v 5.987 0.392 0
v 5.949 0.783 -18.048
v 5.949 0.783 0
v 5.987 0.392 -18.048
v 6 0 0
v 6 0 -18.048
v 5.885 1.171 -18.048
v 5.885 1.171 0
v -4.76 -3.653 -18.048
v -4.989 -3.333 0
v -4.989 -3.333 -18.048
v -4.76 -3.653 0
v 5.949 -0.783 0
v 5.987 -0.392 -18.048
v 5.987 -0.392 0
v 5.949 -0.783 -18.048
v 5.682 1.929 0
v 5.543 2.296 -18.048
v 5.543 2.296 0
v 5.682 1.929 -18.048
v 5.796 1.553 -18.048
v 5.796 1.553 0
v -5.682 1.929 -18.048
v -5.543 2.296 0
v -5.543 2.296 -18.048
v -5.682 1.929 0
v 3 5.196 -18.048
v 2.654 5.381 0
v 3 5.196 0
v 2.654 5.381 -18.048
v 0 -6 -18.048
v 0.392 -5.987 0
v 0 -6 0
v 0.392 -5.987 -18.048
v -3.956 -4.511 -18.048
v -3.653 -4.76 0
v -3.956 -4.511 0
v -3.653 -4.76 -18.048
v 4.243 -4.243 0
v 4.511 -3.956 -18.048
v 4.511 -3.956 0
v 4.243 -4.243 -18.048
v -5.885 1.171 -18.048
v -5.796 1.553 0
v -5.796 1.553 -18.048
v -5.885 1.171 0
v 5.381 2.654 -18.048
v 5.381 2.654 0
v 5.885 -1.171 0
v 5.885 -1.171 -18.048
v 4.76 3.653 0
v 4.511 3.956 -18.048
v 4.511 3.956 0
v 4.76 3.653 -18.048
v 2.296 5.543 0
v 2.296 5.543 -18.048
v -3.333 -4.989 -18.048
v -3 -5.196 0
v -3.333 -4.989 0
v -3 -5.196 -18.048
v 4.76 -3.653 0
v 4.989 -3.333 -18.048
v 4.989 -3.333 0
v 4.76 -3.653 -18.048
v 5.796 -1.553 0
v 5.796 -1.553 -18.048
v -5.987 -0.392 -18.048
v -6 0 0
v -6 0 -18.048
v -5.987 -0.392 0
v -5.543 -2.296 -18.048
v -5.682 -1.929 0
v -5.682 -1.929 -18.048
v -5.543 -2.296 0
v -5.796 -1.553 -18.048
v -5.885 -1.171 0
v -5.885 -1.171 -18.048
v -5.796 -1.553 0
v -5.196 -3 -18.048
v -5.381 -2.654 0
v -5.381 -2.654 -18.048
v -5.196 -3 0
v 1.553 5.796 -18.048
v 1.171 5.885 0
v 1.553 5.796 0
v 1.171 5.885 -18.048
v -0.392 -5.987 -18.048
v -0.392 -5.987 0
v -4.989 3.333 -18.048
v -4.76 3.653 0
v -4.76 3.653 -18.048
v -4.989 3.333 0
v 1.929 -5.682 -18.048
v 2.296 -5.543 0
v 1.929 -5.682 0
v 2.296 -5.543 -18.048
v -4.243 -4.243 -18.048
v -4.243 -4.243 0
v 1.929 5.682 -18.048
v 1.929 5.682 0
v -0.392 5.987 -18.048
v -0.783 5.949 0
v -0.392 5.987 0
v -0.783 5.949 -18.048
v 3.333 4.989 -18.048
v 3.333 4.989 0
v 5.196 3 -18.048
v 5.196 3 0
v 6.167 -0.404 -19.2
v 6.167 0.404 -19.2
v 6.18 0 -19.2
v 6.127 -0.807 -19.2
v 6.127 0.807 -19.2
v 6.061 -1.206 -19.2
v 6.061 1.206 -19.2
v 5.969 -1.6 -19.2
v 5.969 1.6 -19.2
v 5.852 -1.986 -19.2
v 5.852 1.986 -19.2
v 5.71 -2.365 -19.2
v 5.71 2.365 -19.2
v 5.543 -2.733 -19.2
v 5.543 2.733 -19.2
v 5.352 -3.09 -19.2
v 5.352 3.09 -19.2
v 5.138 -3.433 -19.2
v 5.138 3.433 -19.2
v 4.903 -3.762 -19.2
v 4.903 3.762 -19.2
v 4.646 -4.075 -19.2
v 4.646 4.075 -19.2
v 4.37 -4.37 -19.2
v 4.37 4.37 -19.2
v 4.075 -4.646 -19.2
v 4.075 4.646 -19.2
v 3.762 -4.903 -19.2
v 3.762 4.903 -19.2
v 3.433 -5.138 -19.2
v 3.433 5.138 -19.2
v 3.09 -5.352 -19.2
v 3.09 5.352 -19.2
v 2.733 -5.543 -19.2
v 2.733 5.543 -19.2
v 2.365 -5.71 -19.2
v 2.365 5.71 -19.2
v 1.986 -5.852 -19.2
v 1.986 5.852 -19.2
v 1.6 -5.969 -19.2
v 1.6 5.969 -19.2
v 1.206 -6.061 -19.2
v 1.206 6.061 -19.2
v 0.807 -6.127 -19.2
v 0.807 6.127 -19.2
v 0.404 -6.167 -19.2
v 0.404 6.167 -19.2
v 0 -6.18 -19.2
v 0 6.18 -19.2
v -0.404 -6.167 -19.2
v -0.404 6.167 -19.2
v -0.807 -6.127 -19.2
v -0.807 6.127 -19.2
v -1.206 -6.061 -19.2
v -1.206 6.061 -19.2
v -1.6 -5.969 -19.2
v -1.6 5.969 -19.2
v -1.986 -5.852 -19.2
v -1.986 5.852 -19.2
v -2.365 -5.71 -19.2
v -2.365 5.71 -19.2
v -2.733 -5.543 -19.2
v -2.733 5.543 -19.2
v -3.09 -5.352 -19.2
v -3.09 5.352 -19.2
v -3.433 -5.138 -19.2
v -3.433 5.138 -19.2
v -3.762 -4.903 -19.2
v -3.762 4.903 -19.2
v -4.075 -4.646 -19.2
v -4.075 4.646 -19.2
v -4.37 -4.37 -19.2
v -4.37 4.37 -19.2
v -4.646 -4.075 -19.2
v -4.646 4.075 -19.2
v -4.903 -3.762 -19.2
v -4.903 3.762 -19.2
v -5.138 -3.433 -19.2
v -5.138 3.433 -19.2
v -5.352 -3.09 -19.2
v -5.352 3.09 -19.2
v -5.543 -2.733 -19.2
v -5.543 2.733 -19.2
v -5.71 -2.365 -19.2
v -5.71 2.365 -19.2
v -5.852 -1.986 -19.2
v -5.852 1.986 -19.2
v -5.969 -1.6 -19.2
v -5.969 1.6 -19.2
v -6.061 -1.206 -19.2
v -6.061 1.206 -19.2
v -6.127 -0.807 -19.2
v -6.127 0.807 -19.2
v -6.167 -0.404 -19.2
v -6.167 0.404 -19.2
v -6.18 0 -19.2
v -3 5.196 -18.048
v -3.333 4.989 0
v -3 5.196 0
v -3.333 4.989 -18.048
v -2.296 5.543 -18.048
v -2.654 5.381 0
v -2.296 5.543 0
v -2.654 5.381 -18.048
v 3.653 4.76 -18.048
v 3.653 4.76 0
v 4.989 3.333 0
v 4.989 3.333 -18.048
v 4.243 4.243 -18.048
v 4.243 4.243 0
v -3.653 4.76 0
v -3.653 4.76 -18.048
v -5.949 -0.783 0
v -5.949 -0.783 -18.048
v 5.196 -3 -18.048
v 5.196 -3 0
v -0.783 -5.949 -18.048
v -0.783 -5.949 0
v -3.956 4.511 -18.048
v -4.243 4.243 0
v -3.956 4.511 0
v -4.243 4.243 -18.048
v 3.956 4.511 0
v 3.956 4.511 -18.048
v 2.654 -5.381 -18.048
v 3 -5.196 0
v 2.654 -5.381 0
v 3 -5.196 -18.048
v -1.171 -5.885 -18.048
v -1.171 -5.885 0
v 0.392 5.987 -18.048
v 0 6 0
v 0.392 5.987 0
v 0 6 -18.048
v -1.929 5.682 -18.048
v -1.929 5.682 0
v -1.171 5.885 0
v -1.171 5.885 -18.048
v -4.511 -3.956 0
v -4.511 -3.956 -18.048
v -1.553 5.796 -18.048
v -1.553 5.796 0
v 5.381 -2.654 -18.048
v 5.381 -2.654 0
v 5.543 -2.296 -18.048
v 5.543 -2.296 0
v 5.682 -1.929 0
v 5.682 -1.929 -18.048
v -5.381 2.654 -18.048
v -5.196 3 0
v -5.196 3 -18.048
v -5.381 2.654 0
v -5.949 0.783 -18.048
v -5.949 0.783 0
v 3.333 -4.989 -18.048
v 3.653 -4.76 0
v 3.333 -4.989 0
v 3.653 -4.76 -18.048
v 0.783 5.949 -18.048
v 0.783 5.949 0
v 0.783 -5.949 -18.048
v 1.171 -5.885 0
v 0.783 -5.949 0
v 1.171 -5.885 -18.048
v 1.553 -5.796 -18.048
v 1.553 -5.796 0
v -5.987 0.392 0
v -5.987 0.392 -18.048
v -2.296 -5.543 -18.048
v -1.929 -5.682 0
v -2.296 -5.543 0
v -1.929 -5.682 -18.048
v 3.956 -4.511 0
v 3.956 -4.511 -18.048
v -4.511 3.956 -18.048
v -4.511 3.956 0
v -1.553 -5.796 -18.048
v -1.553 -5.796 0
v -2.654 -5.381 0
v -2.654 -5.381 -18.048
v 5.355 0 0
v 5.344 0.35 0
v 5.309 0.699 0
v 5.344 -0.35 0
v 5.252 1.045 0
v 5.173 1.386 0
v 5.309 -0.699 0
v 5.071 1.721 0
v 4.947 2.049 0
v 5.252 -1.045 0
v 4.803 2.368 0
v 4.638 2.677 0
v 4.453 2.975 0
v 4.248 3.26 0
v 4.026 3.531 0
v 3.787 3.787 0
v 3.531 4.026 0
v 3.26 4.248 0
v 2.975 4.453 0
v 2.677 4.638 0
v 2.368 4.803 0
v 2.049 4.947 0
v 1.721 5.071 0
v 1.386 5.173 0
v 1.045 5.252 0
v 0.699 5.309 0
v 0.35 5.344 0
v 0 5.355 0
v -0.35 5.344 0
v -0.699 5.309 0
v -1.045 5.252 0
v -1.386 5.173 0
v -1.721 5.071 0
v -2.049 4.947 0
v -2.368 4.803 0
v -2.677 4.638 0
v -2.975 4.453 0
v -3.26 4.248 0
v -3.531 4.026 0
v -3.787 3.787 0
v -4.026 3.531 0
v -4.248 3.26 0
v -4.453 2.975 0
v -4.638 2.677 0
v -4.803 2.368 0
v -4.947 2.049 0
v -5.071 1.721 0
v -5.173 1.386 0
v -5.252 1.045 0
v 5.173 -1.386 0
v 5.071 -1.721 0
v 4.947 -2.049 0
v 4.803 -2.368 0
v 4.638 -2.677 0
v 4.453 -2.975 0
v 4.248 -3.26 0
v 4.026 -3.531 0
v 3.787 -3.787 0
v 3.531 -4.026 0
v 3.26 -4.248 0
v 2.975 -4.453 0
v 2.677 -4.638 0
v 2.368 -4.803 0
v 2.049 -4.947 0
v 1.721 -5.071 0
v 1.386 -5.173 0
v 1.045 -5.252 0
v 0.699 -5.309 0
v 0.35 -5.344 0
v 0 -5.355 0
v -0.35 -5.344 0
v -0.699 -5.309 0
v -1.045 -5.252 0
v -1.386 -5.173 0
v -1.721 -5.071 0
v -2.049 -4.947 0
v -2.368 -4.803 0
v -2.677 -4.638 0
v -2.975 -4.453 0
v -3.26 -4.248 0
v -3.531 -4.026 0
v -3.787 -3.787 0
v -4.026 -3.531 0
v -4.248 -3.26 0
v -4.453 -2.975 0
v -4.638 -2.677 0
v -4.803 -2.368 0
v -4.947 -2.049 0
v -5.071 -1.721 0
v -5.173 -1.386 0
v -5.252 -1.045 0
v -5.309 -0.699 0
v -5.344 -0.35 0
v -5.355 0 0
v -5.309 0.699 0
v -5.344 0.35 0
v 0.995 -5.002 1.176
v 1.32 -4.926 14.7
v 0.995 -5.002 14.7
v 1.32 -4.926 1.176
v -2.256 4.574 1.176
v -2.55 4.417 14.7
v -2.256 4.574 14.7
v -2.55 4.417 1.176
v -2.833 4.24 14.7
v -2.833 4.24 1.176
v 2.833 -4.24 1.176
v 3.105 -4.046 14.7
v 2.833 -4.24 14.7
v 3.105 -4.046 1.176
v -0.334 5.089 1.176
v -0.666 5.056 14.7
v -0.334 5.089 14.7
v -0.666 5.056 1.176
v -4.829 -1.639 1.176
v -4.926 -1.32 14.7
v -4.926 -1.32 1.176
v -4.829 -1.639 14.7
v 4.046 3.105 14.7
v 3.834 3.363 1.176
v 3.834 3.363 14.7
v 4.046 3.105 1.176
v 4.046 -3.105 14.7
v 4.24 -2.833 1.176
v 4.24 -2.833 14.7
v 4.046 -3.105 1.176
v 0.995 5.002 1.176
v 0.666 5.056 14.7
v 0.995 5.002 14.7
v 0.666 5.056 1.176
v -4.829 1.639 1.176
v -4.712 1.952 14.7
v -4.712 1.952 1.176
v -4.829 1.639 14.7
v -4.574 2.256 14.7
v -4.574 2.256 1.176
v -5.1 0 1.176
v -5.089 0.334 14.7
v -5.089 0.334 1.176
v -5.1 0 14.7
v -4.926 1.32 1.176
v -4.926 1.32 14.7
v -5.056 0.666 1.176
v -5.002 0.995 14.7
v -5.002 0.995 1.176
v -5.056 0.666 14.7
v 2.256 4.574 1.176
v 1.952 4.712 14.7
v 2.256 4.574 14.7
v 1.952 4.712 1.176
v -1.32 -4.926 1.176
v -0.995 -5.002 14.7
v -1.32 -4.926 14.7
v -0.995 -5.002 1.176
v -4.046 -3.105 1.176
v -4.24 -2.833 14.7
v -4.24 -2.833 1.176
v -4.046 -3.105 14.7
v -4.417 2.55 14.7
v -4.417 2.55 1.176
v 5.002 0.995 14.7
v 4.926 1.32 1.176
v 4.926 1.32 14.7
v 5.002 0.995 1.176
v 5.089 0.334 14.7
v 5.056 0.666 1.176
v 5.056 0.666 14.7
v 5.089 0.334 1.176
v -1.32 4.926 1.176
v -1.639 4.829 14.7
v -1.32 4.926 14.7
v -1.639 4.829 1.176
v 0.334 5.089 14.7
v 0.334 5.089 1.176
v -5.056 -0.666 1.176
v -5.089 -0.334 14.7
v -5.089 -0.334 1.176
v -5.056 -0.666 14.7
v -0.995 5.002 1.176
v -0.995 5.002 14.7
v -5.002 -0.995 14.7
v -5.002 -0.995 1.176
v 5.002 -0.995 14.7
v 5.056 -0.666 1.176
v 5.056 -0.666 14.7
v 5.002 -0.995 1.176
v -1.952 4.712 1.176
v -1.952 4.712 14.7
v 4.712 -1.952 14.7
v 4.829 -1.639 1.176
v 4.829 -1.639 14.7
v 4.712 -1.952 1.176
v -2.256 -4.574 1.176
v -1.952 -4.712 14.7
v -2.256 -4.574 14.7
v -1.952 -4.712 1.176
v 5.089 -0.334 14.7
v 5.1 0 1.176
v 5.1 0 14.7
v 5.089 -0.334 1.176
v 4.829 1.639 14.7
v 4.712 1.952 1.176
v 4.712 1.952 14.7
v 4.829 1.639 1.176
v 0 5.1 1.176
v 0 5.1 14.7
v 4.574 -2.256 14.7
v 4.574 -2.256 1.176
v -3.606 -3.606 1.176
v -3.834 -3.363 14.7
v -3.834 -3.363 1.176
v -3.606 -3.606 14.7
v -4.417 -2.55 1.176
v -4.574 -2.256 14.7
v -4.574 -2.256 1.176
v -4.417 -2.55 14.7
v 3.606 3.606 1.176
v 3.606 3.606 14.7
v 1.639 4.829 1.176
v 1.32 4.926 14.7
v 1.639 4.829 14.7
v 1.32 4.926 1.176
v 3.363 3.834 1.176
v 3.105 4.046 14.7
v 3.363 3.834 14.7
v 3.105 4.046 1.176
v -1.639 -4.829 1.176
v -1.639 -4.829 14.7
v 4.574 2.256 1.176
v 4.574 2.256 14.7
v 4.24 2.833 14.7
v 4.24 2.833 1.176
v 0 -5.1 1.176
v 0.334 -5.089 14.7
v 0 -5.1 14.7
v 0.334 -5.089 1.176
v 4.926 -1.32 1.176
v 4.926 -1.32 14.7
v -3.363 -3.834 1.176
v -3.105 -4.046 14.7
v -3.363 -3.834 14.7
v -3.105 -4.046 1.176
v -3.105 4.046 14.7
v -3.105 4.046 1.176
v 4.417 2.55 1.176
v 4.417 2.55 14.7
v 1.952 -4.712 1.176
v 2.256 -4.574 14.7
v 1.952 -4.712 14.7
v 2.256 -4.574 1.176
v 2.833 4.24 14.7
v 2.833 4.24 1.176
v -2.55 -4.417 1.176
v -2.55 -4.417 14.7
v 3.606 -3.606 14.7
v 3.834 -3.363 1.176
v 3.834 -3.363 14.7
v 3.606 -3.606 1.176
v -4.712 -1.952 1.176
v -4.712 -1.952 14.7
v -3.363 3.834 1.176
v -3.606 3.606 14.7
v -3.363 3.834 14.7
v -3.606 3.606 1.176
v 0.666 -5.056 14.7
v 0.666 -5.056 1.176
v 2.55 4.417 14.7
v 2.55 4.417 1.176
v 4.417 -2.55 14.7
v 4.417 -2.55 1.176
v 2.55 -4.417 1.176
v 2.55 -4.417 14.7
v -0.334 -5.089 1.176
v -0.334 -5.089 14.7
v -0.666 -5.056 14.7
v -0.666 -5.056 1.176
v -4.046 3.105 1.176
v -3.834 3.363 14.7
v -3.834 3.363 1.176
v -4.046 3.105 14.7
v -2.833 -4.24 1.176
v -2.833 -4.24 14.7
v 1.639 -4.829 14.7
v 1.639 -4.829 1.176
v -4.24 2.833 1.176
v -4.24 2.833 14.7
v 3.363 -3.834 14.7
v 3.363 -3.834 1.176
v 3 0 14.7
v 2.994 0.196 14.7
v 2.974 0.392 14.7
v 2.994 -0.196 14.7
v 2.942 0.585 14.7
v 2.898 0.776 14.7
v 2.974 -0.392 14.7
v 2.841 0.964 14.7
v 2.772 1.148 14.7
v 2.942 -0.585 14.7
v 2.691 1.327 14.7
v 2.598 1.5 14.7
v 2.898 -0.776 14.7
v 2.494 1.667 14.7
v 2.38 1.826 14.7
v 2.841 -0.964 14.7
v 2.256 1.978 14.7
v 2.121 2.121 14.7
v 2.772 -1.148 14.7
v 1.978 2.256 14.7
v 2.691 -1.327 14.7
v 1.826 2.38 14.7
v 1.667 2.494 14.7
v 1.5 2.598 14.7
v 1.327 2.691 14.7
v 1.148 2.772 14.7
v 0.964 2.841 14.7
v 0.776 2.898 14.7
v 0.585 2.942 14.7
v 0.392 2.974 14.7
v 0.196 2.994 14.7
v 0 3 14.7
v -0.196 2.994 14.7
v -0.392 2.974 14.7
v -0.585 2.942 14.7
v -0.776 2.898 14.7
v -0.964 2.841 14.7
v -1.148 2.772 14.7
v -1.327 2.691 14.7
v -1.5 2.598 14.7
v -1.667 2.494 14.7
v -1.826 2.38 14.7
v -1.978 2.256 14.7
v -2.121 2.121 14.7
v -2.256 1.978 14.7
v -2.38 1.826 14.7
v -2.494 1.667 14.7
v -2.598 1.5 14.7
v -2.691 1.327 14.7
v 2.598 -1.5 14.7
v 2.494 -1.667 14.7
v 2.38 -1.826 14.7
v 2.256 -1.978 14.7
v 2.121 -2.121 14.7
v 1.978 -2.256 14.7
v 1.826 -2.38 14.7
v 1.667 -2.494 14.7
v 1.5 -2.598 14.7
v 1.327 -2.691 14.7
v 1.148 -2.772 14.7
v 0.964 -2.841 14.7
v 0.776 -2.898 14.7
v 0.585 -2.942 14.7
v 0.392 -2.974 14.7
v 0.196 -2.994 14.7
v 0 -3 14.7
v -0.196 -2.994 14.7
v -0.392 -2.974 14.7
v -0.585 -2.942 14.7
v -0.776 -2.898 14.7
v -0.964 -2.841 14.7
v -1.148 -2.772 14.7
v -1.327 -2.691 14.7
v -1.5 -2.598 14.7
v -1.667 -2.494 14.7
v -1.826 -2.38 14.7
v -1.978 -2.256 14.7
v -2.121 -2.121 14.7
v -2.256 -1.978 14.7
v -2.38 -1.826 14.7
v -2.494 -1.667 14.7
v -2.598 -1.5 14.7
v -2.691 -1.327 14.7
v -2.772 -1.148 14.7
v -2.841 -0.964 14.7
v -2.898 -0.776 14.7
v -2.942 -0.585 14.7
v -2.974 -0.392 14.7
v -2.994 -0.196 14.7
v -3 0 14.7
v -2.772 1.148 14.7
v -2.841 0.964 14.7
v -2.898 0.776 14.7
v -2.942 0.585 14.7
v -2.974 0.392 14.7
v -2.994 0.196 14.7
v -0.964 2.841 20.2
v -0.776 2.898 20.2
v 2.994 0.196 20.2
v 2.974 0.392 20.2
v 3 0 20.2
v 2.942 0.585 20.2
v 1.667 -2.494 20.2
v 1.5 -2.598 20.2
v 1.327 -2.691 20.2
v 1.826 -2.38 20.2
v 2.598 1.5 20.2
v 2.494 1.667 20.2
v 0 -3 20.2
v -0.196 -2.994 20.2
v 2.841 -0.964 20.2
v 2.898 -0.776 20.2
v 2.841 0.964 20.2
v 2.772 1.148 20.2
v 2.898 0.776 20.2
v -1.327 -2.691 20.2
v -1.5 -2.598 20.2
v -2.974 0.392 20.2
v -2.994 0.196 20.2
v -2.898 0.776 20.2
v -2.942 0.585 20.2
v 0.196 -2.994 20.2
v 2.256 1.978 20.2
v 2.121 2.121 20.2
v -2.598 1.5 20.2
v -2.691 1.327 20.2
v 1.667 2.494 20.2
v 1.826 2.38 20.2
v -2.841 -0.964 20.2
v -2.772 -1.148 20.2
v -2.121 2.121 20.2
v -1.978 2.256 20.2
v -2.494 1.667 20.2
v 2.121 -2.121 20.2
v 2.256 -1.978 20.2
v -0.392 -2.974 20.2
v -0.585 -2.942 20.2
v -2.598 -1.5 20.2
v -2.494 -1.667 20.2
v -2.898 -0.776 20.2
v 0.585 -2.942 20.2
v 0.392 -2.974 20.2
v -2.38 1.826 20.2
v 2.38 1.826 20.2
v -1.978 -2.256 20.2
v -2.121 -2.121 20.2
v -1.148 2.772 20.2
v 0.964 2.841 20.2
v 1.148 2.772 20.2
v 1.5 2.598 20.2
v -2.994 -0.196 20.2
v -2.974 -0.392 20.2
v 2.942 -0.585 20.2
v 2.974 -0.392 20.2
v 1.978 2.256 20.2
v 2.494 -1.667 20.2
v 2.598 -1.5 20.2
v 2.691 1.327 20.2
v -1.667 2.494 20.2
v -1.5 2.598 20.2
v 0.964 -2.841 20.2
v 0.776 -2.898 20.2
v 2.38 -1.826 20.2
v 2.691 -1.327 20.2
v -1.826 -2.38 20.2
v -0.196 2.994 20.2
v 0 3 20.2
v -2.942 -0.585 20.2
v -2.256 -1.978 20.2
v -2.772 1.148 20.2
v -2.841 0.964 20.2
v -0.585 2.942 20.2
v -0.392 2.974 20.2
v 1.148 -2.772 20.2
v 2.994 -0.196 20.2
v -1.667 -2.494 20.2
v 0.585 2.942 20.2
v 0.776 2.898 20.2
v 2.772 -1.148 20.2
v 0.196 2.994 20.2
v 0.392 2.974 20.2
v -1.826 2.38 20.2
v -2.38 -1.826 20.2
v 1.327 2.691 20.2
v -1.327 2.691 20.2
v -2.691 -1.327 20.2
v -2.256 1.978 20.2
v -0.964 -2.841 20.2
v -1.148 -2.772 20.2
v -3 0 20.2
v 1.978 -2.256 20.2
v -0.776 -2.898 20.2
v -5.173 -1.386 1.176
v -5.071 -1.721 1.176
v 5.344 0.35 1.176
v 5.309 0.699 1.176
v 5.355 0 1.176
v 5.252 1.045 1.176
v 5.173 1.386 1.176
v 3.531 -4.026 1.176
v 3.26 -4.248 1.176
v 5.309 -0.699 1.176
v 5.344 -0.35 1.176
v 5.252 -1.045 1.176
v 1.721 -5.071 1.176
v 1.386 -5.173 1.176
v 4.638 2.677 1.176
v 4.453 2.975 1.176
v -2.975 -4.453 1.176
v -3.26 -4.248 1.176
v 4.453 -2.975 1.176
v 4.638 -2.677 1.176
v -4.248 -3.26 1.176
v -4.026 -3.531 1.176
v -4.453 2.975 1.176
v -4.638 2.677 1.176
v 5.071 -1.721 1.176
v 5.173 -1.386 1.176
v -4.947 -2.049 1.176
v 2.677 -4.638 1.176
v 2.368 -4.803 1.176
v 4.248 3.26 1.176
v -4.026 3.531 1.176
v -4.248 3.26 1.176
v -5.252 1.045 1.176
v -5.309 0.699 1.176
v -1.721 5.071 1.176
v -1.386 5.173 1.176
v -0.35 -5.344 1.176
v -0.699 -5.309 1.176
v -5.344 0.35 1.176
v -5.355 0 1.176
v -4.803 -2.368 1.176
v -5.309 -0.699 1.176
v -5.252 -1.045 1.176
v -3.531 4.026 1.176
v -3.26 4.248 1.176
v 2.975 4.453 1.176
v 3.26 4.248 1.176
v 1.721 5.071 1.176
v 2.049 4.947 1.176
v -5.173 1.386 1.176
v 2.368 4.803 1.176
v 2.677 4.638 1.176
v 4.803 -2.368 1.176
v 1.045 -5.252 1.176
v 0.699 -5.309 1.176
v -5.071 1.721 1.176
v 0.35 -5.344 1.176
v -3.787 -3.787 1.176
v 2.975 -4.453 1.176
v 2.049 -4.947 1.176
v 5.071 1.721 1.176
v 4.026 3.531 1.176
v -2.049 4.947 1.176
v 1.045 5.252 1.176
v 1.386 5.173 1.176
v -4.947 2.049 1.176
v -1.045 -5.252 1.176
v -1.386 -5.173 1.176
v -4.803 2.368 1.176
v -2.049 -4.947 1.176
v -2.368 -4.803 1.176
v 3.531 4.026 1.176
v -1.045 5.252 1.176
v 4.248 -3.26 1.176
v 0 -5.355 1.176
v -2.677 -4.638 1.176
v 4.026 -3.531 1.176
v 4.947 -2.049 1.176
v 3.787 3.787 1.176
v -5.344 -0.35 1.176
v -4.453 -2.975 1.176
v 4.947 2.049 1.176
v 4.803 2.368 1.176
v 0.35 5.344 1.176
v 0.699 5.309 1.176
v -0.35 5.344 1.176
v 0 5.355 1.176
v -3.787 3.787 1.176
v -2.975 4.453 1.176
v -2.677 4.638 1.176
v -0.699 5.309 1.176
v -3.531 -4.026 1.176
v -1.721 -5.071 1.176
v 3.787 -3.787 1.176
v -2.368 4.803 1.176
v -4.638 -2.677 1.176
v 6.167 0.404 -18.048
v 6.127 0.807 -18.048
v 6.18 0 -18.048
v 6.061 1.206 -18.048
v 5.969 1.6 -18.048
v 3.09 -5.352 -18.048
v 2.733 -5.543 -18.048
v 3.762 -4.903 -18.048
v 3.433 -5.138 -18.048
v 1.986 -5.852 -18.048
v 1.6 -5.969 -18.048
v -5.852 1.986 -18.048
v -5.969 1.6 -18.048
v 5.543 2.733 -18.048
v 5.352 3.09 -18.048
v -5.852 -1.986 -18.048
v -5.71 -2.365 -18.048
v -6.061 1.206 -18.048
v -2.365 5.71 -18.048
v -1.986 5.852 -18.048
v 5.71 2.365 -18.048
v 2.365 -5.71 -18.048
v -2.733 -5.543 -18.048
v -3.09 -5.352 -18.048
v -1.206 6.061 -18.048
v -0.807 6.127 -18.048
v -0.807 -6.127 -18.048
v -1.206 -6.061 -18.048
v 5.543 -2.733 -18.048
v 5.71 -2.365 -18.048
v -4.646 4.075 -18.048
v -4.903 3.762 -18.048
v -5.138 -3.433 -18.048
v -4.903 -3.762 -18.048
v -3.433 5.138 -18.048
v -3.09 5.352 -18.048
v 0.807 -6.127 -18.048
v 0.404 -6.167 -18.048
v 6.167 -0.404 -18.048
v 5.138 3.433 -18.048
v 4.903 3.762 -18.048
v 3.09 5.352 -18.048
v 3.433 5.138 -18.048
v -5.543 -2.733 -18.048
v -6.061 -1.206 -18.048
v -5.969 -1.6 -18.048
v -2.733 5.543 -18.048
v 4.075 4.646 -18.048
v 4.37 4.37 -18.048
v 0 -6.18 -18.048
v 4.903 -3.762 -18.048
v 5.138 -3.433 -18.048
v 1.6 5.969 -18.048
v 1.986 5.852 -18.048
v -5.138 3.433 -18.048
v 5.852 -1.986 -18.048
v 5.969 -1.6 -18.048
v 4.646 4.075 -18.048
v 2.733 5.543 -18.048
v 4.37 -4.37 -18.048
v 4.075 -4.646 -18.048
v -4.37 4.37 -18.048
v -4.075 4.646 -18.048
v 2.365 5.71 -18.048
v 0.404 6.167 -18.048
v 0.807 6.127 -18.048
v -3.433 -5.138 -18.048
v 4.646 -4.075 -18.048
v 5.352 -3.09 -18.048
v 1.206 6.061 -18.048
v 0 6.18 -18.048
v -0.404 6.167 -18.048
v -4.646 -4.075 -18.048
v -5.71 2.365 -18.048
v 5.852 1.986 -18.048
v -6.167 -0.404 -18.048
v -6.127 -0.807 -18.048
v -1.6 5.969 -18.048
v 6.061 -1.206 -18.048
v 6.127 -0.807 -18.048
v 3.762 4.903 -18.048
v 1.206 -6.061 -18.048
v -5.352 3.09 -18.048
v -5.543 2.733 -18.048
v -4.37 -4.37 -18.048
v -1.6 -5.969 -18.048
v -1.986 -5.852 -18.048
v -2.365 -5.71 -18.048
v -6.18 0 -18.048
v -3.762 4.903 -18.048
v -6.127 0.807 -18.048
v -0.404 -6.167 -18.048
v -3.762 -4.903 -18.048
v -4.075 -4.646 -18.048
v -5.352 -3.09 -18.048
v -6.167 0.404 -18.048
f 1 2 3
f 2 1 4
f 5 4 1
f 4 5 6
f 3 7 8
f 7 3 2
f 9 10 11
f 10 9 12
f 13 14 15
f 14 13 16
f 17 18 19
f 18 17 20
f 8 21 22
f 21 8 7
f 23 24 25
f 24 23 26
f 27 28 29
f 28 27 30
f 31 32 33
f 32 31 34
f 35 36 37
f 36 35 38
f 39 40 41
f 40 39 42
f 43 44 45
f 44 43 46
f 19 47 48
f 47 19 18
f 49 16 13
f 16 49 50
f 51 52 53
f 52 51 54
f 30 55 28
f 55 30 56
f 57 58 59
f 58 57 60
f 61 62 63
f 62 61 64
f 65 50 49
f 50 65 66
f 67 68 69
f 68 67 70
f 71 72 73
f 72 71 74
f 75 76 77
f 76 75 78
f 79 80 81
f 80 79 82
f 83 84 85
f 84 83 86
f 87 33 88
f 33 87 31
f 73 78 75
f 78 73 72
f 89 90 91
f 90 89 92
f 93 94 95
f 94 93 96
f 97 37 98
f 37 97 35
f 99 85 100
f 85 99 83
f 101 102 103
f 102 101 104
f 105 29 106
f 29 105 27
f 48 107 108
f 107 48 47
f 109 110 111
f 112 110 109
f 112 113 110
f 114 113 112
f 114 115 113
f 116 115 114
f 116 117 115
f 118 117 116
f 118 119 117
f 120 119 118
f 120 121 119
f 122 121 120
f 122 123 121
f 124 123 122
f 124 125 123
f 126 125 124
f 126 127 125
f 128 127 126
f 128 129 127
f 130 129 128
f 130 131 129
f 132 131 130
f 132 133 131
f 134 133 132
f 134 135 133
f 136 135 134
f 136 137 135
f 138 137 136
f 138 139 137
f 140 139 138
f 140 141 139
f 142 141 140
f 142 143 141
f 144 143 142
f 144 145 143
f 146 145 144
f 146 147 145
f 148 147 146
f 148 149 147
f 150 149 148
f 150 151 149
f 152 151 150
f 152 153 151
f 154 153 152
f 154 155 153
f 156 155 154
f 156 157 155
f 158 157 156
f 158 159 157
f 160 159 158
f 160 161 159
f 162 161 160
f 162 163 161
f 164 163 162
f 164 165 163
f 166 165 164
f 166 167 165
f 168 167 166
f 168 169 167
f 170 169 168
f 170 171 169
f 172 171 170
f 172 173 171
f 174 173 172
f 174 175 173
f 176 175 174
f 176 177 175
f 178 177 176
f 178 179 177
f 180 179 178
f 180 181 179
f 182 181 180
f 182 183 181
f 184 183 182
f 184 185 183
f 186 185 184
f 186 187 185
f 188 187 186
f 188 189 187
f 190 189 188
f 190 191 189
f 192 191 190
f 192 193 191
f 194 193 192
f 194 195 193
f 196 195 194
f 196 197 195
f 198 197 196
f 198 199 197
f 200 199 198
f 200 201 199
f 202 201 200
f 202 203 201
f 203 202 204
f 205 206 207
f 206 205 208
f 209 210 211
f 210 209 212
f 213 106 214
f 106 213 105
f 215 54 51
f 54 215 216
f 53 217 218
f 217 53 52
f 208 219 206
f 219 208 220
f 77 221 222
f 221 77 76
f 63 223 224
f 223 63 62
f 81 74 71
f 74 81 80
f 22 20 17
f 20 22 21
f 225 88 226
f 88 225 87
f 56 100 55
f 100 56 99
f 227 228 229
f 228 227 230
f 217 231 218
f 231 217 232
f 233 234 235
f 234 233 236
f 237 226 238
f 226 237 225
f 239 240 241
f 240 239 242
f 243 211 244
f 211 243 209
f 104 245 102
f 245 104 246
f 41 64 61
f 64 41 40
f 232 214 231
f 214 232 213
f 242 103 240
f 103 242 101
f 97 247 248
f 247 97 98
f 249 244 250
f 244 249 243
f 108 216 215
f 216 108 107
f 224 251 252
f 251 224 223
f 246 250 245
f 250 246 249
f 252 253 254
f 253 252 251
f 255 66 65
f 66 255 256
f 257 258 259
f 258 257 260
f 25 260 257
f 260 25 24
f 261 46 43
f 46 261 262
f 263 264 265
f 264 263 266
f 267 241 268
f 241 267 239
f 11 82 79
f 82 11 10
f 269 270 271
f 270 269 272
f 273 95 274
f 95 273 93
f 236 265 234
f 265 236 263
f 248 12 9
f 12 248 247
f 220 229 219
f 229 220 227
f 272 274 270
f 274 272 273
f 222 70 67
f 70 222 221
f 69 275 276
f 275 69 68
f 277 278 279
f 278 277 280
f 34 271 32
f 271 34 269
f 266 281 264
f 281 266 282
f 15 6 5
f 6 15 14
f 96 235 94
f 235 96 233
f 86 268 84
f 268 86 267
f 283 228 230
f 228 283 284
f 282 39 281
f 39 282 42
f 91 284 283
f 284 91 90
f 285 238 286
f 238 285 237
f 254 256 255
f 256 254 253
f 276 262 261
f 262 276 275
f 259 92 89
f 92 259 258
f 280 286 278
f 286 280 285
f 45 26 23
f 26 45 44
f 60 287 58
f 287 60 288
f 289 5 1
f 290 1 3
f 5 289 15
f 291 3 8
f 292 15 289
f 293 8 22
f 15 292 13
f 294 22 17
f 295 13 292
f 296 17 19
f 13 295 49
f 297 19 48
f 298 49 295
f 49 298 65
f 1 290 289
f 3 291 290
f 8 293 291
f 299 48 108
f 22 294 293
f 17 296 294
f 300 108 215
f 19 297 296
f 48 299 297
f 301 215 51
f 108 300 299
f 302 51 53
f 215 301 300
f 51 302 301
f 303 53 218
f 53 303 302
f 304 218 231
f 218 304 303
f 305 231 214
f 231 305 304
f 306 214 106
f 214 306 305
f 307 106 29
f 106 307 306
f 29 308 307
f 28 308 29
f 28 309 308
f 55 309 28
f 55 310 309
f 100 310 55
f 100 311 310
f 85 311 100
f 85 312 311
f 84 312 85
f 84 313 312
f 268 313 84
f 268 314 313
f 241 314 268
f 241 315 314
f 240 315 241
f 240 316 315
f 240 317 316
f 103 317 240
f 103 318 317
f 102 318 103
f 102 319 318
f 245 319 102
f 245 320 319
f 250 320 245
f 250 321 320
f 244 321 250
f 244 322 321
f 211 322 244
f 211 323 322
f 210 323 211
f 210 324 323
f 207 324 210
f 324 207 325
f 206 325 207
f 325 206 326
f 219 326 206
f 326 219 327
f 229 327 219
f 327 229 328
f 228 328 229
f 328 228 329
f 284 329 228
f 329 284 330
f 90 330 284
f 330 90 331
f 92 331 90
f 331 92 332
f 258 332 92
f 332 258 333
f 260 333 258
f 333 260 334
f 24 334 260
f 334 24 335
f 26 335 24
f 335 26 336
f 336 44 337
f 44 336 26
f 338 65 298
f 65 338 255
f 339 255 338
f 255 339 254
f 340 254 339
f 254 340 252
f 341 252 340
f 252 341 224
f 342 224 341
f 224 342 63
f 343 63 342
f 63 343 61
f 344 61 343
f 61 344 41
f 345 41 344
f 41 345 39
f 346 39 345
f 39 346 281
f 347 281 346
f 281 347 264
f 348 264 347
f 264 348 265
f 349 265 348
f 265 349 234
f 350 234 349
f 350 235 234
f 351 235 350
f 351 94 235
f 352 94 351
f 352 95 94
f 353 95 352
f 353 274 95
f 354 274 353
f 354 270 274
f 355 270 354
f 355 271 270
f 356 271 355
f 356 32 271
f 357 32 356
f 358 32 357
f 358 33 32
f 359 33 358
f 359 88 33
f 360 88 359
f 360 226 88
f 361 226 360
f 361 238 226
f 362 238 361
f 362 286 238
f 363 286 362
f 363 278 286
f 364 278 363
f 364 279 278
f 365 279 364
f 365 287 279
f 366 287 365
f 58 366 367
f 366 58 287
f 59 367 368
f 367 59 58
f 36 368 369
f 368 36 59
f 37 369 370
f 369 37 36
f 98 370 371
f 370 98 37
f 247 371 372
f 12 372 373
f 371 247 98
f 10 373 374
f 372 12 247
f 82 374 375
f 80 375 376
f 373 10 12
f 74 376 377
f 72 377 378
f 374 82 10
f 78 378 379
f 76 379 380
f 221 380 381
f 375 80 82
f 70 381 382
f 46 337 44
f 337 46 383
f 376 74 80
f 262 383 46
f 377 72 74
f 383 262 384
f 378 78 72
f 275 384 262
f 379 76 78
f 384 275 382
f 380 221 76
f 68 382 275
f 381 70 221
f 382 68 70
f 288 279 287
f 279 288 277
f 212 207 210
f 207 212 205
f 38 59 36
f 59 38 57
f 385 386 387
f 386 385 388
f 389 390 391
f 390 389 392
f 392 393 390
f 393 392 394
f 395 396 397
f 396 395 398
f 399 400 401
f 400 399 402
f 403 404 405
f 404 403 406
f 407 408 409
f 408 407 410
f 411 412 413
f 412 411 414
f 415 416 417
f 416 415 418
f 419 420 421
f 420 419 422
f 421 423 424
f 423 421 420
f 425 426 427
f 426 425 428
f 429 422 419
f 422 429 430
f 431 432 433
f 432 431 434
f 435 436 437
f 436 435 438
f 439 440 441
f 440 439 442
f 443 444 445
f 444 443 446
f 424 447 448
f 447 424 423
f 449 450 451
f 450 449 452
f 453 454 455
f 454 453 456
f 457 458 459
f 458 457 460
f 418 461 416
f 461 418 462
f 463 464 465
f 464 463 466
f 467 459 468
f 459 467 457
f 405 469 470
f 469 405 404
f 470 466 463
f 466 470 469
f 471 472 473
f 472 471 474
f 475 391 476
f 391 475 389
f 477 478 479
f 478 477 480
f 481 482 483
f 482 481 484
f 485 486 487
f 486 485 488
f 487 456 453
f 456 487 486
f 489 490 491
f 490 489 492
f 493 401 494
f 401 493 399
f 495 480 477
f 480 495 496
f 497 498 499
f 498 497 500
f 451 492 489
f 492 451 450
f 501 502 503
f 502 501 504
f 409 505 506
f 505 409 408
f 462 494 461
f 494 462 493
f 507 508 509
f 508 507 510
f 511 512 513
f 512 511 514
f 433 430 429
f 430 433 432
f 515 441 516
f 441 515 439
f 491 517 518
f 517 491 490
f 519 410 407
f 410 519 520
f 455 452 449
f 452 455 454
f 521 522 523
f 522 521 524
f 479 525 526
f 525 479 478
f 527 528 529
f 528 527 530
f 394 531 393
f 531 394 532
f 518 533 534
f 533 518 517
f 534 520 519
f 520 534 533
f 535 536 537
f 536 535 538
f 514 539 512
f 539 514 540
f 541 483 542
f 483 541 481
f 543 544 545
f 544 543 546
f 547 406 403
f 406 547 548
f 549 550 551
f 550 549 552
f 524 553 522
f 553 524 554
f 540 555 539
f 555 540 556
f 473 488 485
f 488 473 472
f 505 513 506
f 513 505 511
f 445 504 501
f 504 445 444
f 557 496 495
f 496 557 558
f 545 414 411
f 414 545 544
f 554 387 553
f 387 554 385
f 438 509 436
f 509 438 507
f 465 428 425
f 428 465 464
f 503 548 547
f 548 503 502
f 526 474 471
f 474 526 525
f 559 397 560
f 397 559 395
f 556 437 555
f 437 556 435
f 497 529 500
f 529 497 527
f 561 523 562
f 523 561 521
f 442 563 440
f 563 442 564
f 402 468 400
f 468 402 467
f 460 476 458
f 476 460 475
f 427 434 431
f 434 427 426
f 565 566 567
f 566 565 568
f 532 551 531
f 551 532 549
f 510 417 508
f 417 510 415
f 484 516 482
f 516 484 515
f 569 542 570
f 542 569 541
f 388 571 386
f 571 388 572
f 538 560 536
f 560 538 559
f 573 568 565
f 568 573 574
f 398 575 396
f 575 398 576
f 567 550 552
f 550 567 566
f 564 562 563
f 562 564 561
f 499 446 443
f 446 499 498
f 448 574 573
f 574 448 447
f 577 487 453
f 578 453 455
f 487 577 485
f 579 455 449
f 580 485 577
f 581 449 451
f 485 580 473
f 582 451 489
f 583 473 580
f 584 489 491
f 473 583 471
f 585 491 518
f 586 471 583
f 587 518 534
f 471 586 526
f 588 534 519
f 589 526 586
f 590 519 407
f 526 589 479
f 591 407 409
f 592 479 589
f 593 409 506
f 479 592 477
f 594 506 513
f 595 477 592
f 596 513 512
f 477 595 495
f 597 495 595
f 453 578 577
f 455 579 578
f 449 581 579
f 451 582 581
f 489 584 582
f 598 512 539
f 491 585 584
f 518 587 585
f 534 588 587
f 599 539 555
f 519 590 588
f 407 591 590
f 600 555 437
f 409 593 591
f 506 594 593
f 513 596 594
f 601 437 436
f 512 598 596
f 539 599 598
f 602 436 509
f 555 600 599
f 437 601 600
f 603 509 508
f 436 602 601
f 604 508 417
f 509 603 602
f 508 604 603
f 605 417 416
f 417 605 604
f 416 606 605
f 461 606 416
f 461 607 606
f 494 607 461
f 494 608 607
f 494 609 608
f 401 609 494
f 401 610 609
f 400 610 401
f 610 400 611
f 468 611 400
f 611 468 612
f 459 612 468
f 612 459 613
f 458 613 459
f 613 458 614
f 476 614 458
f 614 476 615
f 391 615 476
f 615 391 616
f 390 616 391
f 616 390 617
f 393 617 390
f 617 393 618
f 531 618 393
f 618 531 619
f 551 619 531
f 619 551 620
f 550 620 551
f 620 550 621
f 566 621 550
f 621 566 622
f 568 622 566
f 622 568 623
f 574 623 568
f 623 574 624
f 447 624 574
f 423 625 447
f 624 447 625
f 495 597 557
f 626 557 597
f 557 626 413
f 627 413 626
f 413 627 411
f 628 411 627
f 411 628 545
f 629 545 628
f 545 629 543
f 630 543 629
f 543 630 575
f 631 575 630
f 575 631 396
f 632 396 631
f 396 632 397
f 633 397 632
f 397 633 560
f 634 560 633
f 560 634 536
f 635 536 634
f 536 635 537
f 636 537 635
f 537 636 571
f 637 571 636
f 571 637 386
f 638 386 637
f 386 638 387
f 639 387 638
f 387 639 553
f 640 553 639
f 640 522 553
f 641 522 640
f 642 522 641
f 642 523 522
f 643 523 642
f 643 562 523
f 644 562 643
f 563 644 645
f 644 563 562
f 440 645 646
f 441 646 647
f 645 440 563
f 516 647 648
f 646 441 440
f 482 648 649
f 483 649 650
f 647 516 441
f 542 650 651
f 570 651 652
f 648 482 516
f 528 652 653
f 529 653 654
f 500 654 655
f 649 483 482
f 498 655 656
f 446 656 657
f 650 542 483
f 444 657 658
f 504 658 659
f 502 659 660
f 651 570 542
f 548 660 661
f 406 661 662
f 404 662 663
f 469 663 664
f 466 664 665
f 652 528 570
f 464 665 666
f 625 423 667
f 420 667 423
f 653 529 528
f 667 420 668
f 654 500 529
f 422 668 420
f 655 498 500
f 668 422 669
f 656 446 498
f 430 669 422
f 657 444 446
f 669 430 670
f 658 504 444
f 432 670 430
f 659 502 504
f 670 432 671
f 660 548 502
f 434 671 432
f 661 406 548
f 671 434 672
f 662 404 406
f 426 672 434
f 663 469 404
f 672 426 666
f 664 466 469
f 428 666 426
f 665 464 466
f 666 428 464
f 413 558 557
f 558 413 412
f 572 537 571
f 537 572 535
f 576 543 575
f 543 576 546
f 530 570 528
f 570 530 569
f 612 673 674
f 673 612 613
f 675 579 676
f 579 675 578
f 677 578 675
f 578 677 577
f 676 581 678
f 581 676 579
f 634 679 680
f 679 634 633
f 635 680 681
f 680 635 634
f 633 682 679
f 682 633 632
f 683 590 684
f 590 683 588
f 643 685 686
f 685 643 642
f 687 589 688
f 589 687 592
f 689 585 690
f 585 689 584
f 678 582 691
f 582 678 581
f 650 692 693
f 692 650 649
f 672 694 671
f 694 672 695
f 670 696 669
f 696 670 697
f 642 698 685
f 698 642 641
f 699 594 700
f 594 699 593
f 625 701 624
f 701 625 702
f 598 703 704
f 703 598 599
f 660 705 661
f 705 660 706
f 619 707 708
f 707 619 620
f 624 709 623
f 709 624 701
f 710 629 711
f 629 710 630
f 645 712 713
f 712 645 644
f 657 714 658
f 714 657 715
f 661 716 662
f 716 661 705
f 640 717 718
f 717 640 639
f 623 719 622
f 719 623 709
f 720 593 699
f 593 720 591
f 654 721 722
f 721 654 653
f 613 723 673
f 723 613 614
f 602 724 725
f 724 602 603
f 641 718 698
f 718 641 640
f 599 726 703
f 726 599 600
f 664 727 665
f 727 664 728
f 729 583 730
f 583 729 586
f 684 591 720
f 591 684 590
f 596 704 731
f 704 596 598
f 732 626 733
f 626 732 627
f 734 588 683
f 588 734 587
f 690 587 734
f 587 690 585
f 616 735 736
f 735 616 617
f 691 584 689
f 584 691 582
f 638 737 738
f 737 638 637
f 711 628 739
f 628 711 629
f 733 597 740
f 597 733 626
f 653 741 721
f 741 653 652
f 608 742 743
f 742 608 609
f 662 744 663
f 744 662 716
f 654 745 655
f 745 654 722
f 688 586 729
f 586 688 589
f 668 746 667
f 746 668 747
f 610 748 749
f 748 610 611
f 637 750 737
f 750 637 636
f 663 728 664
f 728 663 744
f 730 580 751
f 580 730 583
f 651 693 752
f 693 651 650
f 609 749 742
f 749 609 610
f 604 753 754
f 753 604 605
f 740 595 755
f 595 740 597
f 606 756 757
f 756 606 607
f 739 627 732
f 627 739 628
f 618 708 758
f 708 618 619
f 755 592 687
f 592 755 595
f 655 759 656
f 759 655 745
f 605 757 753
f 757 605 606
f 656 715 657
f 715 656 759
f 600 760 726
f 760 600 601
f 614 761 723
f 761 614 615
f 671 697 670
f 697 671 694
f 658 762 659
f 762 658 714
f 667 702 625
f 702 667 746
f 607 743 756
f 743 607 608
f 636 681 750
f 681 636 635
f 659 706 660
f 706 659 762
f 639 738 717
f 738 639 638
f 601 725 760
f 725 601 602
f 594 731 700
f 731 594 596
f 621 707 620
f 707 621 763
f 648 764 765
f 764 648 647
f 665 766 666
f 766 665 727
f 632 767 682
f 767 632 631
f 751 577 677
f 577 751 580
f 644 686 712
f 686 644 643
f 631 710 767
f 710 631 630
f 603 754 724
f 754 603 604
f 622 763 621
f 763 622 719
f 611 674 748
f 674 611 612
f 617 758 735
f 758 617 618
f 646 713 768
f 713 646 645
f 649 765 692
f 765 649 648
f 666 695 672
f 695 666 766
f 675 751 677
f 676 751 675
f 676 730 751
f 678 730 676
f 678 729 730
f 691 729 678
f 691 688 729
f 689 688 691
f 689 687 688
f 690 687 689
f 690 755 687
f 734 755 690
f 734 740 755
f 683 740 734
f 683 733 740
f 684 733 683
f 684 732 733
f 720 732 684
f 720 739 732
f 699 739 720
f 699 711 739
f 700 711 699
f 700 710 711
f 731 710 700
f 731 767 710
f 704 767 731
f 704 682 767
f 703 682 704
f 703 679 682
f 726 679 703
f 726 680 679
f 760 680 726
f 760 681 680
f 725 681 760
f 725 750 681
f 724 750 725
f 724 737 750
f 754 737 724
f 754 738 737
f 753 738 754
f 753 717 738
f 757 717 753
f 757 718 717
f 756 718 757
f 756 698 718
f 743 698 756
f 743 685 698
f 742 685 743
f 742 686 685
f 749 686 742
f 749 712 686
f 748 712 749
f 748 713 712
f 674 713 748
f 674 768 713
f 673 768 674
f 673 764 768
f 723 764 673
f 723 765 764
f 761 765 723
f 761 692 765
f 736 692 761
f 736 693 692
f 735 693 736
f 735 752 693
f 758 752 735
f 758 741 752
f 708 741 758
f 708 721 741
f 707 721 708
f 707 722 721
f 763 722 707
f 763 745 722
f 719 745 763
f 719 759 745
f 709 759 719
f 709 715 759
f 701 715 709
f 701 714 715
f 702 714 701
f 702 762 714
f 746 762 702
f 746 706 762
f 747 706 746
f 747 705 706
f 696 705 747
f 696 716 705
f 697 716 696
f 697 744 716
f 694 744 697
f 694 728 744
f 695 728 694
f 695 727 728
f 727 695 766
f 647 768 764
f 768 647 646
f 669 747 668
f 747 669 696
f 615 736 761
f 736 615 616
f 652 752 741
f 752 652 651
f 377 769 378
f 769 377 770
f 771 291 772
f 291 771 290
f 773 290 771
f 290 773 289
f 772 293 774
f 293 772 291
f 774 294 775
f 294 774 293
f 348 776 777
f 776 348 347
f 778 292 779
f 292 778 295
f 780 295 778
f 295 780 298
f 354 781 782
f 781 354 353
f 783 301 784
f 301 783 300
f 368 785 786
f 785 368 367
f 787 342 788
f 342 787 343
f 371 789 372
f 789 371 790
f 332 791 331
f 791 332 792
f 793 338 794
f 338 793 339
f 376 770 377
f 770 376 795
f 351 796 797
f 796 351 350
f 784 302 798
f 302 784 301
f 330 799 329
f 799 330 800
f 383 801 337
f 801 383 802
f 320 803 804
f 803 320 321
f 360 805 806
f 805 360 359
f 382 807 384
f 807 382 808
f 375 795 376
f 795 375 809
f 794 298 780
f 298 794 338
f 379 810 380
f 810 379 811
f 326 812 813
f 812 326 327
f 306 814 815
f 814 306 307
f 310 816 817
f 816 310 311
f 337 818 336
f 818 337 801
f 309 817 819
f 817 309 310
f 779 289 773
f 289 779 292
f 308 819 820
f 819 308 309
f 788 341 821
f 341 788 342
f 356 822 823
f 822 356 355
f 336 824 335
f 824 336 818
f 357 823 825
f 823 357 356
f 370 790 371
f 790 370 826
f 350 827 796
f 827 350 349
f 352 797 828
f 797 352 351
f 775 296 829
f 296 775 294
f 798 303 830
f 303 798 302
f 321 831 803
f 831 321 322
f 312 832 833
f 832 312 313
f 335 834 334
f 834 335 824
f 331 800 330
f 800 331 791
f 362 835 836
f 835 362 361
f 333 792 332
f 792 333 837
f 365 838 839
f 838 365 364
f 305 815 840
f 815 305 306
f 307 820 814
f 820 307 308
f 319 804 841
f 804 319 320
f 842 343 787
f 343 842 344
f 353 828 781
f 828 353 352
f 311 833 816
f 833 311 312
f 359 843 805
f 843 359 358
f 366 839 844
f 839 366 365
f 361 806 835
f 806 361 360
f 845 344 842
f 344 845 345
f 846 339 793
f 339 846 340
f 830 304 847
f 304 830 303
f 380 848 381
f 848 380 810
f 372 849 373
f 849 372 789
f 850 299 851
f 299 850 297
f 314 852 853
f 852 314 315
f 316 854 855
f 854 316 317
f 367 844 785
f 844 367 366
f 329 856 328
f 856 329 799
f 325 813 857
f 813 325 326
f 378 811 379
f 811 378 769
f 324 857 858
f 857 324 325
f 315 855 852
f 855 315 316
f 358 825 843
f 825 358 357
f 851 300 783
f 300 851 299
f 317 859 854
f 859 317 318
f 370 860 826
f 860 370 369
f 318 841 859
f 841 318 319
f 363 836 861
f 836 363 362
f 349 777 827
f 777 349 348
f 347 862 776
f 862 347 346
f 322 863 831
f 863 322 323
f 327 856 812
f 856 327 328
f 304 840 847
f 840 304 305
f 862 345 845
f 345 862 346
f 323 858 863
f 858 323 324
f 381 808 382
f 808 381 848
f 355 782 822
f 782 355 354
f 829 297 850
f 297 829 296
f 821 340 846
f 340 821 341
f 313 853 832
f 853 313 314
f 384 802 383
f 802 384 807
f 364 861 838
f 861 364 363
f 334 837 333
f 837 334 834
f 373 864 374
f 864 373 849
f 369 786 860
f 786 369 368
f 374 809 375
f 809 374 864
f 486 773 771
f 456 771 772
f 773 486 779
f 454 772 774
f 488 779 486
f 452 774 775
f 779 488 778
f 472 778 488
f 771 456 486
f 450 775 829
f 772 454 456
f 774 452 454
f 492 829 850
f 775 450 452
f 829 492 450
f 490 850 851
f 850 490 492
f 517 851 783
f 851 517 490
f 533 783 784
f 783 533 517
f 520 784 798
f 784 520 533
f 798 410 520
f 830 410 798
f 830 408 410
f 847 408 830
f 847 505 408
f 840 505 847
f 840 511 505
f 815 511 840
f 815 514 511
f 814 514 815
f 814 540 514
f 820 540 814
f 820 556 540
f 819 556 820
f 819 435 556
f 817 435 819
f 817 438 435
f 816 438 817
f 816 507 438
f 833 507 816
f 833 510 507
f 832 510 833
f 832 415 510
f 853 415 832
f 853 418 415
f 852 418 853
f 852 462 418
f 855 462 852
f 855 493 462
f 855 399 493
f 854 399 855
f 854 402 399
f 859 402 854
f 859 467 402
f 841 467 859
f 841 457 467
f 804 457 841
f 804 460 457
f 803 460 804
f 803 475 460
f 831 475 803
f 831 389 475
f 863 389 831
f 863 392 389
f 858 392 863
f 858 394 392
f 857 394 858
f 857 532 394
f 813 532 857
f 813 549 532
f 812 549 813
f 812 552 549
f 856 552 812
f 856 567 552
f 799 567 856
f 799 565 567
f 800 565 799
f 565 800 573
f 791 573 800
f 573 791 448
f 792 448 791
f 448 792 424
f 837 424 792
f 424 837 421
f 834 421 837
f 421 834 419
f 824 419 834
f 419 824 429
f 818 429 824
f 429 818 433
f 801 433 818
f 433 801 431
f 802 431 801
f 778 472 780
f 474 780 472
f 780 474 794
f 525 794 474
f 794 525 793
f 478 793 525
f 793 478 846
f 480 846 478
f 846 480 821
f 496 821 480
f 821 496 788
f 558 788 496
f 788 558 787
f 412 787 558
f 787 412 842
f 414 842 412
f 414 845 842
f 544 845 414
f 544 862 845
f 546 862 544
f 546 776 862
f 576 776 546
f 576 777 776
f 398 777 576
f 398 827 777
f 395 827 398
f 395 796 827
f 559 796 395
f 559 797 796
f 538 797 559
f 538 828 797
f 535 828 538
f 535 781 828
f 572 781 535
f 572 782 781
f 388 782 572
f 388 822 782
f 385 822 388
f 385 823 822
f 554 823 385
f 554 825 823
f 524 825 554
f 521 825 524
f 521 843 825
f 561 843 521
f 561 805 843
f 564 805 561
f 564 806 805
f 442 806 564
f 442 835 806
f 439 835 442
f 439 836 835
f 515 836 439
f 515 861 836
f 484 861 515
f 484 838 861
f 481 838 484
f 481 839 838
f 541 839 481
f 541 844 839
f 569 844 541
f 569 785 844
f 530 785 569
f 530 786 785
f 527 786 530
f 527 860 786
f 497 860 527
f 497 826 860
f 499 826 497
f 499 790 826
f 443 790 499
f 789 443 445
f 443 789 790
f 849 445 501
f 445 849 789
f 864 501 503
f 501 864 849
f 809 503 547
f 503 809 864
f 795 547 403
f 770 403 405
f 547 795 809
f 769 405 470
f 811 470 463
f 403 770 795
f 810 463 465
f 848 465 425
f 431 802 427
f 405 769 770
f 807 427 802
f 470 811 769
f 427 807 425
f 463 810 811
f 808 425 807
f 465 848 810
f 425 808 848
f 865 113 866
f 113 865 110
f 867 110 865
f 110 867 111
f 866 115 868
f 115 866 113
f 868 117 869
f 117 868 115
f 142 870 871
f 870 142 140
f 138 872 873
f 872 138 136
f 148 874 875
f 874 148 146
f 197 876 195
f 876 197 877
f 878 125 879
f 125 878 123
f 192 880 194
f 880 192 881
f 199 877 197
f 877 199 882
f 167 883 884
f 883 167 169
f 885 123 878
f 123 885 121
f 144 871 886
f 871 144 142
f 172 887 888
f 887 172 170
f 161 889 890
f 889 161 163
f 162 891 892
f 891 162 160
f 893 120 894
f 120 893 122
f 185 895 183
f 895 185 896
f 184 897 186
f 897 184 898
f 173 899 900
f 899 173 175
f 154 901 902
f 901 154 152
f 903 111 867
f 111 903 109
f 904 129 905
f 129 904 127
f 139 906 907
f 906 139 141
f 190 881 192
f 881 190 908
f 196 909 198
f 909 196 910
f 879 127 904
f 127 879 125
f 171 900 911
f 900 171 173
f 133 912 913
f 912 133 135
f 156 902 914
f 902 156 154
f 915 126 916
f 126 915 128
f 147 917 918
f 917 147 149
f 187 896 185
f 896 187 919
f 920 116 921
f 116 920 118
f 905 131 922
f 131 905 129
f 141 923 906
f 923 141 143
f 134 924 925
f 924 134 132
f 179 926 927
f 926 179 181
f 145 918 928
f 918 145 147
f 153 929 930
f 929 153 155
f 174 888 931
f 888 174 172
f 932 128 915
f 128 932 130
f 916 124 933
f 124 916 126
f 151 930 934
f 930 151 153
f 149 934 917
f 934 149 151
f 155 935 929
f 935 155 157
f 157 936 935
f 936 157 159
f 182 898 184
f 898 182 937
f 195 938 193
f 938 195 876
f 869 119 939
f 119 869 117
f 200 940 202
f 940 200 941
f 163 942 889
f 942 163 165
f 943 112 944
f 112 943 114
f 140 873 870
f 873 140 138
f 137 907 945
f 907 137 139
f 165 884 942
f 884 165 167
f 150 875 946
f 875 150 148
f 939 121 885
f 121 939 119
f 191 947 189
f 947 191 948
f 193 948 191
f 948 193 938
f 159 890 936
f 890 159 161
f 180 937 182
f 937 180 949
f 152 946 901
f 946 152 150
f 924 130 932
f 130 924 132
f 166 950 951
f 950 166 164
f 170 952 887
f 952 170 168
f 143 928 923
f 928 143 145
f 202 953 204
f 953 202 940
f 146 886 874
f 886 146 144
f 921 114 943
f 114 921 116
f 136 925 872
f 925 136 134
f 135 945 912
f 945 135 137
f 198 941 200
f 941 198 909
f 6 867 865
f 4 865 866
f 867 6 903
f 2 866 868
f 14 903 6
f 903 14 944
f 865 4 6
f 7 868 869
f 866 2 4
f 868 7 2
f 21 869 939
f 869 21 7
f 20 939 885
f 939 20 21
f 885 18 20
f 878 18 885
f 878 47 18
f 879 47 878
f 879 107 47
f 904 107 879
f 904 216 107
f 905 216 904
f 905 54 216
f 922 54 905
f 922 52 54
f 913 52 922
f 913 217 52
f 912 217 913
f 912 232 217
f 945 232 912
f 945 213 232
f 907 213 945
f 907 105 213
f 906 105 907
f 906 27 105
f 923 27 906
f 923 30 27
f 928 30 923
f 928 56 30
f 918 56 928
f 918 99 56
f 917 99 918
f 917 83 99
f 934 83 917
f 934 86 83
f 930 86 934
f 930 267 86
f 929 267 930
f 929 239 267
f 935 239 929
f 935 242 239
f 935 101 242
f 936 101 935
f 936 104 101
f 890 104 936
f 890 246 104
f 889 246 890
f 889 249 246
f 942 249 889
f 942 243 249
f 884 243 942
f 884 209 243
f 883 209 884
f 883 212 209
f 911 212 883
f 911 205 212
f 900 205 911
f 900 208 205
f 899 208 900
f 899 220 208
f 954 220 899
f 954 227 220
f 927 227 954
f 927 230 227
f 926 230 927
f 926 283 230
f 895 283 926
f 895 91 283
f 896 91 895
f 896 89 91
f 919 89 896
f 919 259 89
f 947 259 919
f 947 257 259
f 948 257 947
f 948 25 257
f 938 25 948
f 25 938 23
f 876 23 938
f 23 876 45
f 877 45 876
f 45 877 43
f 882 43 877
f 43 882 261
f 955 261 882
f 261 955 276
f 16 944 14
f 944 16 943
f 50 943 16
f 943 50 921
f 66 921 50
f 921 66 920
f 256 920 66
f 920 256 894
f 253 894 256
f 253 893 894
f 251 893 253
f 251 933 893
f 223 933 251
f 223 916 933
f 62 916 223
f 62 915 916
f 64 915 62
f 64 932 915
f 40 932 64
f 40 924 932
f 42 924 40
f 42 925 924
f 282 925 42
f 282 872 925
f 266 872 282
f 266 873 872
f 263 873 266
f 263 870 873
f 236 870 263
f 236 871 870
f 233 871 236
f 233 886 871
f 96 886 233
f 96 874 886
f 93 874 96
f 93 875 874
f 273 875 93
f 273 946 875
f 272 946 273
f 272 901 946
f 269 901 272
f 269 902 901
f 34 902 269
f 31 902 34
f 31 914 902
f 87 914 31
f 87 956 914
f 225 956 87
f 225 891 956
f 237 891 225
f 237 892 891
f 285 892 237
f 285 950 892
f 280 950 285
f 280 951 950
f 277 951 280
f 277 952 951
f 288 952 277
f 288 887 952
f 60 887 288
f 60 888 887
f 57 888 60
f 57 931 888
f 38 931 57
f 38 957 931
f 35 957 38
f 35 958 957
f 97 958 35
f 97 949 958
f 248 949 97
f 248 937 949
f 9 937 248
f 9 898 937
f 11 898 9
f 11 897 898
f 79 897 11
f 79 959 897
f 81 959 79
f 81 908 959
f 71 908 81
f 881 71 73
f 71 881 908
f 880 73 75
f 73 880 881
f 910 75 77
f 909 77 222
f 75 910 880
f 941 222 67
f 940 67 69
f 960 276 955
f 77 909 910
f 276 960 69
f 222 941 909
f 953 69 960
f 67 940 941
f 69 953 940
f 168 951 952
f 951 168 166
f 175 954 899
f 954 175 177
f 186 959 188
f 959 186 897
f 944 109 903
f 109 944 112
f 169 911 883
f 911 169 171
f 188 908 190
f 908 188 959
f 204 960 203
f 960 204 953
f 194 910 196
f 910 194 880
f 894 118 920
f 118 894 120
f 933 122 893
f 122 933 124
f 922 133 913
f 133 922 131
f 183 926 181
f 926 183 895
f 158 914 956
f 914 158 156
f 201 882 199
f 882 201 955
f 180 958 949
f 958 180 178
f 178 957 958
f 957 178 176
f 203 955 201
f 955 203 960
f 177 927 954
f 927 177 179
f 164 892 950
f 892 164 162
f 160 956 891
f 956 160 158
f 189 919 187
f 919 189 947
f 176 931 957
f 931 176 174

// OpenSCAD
$fn = 96;

// Gear motor parameters: [6, 5.5, 14.7, 12]
shaft_d = 6;
shaft_len = 5.5;
gearbox_len = 14.7;
motor_d = 12;

// Derived proportions (simple, renderable approximation)
gearbox_d = motor_d * 0.85;
motor_len = motor_d * 1.6;

module gear_motor(shaft_d, shaft_len, gearbox_len, motor_d) {
    gearbox_d = motor_d * 0.85;
    motor_len = motor_d * 1.6;

    union() {
        // Motor can (rear)
        translate([0, 0, -motor_len])
            cylinder(d = motor_d, h = motor_len);

        // Gearbox (front)
        cylinder(d = gearbox_d, h = gearbox_len);

        // Output shaft
        translate([0, 0, gearbox_len])
            cylinder(d = shaft_d, h = shaft_len);

        // Small front flange lip
        translate([0, 0, 0])
            cylinder(d = gearbox_d * 1.05, h = gearbox_len * 0.08);

        // Rear cap lip
        translate([0, 0, -motor_len])
            cylinder(d = motor_d * 1.03, h = motor_len * 0.06);
    }
}

gear_motor(shaft_d, shaft_len, gearbox_len, motor_d);
